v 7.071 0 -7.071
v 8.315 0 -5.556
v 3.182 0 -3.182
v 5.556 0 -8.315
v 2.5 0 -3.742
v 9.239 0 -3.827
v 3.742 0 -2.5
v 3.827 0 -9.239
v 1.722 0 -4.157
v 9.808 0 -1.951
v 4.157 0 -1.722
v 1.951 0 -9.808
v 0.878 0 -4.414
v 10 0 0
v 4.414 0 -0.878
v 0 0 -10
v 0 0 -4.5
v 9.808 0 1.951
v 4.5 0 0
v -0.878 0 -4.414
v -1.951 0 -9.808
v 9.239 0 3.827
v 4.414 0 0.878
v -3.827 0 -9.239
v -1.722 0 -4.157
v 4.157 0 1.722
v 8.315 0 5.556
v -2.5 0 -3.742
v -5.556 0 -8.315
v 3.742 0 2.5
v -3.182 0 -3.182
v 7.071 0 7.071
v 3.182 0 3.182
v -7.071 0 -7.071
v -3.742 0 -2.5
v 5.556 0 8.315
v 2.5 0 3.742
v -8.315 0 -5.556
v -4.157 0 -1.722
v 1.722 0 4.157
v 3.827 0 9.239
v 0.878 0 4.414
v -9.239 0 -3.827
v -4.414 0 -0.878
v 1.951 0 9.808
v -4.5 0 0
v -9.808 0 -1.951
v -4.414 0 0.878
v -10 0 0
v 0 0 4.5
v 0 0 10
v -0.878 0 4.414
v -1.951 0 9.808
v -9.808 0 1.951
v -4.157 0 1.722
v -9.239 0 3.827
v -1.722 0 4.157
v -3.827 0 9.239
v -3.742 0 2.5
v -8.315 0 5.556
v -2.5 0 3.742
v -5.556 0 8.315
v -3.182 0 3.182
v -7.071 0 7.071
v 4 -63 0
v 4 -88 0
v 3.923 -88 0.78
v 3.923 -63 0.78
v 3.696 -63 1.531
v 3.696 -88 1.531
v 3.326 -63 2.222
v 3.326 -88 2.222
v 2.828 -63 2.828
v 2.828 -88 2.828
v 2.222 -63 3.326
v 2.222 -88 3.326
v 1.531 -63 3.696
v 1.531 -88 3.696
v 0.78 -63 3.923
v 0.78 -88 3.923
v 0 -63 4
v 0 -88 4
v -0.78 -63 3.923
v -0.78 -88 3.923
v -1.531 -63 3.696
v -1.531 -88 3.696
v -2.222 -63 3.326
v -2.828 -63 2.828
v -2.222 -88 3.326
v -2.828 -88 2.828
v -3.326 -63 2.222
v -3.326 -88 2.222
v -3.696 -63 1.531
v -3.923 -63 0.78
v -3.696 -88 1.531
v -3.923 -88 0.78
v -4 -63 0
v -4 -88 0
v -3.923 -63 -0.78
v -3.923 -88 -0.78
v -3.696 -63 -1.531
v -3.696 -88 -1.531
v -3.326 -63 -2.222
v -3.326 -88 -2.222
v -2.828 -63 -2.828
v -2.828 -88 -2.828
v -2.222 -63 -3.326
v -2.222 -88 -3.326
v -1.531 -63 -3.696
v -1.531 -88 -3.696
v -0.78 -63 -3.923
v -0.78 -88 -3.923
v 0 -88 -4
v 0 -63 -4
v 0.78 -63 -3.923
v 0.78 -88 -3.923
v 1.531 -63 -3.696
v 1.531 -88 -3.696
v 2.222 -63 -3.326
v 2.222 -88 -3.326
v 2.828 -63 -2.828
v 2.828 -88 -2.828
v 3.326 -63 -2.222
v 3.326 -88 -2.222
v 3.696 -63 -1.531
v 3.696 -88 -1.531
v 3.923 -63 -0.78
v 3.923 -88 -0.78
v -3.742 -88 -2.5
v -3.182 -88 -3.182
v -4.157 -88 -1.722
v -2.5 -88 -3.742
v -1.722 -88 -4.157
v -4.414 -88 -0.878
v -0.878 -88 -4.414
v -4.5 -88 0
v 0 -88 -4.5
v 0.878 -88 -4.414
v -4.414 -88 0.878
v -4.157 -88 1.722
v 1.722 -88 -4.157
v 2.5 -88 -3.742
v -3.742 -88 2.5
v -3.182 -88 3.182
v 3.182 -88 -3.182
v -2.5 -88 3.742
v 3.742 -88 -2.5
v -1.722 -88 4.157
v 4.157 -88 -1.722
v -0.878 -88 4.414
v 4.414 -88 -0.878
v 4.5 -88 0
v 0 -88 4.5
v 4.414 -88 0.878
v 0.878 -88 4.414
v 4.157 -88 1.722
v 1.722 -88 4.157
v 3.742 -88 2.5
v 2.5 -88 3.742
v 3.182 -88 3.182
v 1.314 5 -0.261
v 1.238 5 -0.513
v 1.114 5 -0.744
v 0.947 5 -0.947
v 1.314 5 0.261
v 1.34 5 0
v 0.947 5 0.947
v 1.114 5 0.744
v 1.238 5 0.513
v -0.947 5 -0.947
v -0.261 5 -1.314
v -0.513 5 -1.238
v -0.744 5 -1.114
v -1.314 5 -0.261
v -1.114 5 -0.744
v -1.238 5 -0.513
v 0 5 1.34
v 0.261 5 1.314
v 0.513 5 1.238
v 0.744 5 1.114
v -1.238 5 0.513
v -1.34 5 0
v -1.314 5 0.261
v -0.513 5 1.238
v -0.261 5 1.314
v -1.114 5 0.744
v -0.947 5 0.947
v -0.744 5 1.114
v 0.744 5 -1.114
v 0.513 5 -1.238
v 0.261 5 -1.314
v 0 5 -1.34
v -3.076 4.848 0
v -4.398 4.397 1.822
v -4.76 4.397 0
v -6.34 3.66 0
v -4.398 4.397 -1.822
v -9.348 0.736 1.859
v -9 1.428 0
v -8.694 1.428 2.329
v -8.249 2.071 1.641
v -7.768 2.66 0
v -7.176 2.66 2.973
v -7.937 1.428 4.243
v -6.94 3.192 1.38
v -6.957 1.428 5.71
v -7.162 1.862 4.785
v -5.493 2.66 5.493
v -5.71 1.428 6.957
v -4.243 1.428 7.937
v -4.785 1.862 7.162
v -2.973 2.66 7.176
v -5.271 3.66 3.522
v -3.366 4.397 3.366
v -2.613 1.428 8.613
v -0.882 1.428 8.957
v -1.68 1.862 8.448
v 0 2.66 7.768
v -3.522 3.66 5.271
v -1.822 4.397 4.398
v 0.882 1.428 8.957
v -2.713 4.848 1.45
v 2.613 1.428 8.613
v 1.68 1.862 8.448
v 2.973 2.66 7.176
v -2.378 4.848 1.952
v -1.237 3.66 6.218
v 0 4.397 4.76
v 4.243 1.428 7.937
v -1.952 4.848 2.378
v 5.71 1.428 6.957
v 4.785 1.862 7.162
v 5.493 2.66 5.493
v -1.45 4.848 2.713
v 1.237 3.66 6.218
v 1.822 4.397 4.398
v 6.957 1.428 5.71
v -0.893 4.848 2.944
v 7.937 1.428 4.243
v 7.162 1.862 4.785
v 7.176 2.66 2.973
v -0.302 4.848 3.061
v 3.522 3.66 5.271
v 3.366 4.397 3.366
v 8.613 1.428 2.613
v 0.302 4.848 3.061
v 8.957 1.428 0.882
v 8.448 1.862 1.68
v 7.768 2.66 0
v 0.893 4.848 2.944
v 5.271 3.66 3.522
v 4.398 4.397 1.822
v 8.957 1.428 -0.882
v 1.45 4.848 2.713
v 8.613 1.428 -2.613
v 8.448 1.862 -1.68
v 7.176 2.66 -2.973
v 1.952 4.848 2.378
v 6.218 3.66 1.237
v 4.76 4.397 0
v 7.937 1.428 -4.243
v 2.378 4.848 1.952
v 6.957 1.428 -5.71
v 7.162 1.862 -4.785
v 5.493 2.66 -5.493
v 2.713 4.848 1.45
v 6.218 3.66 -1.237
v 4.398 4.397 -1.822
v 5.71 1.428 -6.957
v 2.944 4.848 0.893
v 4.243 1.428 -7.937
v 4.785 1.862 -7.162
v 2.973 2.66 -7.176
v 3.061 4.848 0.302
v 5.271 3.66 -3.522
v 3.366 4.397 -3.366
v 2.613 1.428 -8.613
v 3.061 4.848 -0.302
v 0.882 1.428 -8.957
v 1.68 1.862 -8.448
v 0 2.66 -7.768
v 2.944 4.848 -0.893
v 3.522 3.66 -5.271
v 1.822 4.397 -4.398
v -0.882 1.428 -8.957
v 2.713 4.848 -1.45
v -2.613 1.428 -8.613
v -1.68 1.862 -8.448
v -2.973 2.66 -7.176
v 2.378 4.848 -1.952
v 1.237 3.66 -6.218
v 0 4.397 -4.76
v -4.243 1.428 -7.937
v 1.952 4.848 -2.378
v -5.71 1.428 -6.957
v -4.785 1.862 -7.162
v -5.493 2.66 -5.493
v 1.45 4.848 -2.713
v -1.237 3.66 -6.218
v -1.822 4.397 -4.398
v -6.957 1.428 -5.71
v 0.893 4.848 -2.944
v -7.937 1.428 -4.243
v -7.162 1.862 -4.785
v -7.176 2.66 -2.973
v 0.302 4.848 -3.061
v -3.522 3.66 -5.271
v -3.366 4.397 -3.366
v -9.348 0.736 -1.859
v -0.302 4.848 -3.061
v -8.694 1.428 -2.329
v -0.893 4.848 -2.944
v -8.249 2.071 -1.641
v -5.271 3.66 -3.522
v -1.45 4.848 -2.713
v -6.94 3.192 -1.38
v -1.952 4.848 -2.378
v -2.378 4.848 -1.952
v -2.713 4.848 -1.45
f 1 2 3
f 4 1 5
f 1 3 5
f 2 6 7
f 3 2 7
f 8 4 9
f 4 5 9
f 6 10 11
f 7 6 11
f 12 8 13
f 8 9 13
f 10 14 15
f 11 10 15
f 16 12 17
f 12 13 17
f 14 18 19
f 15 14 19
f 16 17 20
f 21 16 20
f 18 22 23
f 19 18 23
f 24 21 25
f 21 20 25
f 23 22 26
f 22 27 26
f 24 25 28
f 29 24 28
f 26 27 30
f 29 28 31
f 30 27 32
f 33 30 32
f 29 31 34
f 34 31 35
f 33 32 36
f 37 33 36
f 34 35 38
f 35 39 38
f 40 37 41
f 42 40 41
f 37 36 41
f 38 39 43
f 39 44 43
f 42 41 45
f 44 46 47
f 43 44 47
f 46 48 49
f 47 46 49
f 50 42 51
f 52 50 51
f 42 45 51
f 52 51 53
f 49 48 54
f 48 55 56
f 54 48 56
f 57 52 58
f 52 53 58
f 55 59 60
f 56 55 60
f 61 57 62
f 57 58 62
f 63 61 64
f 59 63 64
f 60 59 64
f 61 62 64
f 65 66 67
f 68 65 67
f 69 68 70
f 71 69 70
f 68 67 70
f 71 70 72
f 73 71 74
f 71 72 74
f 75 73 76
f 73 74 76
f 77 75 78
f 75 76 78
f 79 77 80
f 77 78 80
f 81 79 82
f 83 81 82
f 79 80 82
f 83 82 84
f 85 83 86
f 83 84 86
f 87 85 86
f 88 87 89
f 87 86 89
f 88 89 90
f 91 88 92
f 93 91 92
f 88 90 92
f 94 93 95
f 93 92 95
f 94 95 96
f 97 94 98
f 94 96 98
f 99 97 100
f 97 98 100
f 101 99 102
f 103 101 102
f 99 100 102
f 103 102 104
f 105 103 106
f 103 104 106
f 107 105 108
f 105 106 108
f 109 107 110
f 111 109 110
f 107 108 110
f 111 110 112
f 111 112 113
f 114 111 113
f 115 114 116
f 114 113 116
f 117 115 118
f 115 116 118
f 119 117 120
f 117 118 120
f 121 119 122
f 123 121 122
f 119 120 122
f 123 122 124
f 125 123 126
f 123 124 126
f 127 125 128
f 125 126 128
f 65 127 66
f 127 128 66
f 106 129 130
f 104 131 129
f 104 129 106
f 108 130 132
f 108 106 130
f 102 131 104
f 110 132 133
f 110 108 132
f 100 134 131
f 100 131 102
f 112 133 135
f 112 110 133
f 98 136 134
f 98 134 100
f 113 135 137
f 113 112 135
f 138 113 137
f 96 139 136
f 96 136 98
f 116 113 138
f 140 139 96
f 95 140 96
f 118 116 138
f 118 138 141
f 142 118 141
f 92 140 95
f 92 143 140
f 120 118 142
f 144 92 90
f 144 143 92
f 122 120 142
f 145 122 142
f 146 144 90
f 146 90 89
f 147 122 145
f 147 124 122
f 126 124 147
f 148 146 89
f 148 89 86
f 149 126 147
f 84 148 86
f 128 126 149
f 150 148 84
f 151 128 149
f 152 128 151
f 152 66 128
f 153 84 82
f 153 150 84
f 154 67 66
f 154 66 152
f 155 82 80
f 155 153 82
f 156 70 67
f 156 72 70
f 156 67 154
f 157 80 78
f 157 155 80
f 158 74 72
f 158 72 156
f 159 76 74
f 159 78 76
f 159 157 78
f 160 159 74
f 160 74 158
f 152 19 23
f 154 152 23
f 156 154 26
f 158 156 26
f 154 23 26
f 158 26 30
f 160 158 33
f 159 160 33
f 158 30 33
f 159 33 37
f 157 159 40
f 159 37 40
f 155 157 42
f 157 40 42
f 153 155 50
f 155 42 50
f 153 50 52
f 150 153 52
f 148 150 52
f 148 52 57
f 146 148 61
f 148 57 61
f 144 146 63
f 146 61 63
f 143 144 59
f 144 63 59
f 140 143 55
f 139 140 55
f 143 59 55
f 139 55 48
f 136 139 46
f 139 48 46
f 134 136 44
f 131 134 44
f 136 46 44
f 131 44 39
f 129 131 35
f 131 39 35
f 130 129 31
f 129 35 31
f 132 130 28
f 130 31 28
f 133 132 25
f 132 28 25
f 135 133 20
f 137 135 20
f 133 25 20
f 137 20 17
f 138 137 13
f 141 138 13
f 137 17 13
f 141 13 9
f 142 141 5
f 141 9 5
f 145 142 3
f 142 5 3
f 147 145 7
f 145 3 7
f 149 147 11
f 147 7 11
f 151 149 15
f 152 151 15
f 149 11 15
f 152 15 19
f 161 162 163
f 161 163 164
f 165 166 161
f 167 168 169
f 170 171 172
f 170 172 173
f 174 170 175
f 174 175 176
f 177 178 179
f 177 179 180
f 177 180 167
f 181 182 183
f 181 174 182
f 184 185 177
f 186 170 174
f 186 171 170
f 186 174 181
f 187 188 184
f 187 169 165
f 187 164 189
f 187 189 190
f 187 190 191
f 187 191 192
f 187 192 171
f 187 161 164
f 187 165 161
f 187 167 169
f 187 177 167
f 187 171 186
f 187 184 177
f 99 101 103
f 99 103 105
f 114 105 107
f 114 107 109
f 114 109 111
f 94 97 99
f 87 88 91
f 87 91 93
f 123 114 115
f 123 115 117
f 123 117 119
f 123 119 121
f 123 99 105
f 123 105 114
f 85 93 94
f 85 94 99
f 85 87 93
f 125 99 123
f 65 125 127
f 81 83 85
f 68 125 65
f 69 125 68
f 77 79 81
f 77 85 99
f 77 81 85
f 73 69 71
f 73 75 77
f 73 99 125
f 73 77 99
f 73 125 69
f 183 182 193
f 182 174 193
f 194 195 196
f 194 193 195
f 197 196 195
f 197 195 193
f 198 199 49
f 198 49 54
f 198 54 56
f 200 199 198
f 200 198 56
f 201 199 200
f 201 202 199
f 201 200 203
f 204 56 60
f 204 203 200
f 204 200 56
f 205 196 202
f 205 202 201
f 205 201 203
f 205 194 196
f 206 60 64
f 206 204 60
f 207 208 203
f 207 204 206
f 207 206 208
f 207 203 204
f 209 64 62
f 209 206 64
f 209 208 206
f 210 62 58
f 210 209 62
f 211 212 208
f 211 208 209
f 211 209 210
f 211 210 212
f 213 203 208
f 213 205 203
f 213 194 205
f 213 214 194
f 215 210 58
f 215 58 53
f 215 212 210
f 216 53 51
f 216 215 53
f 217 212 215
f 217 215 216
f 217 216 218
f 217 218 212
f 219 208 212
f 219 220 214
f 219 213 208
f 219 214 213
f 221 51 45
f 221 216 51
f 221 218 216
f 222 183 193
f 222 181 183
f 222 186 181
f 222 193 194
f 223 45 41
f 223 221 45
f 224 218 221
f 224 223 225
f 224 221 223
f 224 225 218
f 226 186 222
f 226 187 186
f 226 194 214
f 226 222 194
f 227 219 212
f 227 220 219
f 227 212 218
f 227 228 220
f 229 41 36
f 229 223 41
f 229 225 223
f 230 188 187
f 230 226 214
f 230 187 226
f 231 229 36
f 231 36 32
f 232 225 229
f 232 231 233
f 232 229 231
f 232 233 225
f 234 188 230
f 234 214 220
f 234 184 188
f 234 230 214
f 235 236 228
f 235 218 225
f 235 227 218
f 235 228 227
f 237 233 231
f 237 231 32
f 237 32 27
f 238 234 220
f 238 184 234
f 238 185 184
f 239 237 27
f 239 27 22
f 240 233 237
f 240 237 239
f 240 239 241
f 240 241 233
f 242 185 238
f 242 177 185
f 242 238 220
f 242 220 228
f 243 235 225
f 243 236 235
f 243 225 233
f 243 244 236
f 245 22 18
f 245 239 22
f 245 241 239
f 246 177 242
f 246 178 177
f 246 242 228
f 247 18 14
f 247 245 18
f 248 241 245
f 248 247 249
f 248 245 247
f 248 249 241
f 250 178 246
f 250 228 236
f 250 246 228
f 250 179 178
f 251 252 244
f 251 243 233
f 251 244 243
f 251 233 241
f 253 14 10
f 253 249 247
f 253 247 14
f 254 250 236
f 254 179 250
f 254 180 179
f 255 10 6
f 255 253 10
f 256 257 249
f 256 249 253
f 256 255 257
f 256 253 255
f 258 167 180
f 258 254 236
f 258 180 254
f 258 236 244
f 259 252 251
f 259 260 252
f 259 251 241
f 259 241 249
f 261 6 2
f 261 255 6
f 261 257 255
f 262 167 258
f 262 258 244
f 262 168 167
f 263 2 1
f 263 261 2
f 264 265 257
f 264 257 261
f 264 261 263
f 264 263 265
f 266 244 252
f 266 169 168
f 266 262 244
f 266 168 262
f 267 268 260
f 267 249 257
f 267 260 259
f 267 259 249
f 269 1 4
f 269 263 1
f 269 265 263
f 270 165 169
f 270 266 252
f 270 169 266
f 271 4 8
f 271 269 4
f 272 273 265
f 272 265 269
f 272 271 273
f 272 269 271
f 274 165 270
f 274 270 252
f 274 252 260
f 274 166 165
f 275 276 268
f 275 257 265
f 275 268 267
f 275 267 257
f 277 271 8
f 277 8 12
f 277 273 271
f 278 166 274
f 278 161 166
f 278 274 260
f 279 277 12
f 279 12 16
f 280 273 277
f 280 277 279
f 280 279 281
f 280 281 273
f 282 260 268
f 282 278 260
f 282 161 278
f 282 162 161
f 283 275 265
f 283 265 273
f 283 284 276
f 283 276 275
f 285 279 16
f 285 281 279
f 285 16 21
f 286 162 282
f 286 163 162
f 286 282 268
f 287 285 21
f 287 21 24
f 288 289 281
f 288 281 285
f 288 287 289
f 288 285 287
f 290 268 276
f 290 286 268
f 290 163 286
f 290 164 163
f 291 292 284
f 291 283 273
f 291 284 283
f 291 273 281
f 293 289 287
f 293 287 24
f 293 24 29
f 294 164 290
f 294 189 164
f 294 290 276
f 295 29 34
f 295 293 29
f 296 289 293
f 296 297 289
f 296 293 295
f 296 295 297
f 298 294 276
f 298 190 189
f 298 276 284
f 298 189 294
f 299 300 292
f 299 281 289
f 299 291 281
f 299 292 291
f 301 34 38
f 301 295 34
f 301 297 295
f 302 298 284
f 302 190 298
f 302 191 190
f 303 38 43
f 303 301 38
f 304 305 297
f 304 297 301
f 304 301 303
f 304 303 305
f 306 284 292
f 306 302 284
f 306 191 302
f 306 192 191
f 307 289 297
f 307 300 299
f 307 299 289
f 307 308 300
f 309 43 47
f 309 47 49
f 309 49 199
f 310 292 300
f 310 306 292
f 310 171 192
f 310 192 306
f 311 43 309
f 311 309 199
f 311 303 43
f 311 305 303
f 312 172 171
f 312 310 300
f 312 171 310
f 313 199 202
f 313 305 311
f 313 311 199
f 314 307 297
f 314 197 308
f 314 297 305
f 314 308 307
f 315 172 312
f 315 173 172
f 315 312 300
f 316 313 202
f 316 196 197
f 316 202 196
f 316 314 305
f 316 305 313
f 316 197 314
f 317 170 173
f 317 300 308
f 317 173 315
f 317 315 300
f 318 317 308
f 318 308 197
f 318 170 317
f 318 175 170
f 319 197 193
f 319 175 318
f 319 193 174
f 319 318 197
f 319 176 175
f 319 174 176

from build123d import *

# Parameters (mm, degrees)
F0_R     = 4.5
F1_DEPTH = 88
F2_R     = 4
F3_DEPTH = 25
F4_R     = 10
F4_R_2   = 4.5
F5_DEPTH = 5


# Not quite as in the source:
# - a fillet or chamfer that OpenCascade refuses, or shapes differently, is made with other operations: its cross-section is extruded or revolved along the edge and cut away or added


with BuildPart() as f1:
    # F0 (on Front) → F1 (new body)
    with BuildSketch(Plane.XZ):
        Circle(F0_R)
    extrude(amount=F1_DEPTH)

    # F2 (on face) → F3 (cut)
    with BuildSketch(Plane.XZ.offset(88)):
        Circle(F2_R)
    extrude(amount=-F3_DEPTH, mode=Mode.SUBTRACT)

    # F4 (on face) → F5 (join)
    with BuildSketch(Plane(origin=(0, 0, 0), x_dir=(-1, 0, 0), z_dir=(0, 1, 0))):
        Circle(F4_R)
        Circle(F4_R_2, mode=Mode.SUBTRACT)
        Circle(F4_R_2)
    extrude(amount=F5_DEPTH)

    # F6: fillet of radius 10 on 1 edges, made by hand

    # F6_s1 → F6_t2 (revolve, cut)
    with BuildSketch(Plane.XY):
        with BuildLine():
            ThreePointArc((-10, 0), (-6.3397459622, 3.6602540378), (-1.3397459622, 5))
            Line((-1.3397459622, 5), (-10, 5))
            Line((-10, 5), (-10, 0))
        make_face()
    revolve(axis=Axis((0, 5, 0), (0, 1, 0)), mode=Mode.SUBTRACT)


solid = f1.part
